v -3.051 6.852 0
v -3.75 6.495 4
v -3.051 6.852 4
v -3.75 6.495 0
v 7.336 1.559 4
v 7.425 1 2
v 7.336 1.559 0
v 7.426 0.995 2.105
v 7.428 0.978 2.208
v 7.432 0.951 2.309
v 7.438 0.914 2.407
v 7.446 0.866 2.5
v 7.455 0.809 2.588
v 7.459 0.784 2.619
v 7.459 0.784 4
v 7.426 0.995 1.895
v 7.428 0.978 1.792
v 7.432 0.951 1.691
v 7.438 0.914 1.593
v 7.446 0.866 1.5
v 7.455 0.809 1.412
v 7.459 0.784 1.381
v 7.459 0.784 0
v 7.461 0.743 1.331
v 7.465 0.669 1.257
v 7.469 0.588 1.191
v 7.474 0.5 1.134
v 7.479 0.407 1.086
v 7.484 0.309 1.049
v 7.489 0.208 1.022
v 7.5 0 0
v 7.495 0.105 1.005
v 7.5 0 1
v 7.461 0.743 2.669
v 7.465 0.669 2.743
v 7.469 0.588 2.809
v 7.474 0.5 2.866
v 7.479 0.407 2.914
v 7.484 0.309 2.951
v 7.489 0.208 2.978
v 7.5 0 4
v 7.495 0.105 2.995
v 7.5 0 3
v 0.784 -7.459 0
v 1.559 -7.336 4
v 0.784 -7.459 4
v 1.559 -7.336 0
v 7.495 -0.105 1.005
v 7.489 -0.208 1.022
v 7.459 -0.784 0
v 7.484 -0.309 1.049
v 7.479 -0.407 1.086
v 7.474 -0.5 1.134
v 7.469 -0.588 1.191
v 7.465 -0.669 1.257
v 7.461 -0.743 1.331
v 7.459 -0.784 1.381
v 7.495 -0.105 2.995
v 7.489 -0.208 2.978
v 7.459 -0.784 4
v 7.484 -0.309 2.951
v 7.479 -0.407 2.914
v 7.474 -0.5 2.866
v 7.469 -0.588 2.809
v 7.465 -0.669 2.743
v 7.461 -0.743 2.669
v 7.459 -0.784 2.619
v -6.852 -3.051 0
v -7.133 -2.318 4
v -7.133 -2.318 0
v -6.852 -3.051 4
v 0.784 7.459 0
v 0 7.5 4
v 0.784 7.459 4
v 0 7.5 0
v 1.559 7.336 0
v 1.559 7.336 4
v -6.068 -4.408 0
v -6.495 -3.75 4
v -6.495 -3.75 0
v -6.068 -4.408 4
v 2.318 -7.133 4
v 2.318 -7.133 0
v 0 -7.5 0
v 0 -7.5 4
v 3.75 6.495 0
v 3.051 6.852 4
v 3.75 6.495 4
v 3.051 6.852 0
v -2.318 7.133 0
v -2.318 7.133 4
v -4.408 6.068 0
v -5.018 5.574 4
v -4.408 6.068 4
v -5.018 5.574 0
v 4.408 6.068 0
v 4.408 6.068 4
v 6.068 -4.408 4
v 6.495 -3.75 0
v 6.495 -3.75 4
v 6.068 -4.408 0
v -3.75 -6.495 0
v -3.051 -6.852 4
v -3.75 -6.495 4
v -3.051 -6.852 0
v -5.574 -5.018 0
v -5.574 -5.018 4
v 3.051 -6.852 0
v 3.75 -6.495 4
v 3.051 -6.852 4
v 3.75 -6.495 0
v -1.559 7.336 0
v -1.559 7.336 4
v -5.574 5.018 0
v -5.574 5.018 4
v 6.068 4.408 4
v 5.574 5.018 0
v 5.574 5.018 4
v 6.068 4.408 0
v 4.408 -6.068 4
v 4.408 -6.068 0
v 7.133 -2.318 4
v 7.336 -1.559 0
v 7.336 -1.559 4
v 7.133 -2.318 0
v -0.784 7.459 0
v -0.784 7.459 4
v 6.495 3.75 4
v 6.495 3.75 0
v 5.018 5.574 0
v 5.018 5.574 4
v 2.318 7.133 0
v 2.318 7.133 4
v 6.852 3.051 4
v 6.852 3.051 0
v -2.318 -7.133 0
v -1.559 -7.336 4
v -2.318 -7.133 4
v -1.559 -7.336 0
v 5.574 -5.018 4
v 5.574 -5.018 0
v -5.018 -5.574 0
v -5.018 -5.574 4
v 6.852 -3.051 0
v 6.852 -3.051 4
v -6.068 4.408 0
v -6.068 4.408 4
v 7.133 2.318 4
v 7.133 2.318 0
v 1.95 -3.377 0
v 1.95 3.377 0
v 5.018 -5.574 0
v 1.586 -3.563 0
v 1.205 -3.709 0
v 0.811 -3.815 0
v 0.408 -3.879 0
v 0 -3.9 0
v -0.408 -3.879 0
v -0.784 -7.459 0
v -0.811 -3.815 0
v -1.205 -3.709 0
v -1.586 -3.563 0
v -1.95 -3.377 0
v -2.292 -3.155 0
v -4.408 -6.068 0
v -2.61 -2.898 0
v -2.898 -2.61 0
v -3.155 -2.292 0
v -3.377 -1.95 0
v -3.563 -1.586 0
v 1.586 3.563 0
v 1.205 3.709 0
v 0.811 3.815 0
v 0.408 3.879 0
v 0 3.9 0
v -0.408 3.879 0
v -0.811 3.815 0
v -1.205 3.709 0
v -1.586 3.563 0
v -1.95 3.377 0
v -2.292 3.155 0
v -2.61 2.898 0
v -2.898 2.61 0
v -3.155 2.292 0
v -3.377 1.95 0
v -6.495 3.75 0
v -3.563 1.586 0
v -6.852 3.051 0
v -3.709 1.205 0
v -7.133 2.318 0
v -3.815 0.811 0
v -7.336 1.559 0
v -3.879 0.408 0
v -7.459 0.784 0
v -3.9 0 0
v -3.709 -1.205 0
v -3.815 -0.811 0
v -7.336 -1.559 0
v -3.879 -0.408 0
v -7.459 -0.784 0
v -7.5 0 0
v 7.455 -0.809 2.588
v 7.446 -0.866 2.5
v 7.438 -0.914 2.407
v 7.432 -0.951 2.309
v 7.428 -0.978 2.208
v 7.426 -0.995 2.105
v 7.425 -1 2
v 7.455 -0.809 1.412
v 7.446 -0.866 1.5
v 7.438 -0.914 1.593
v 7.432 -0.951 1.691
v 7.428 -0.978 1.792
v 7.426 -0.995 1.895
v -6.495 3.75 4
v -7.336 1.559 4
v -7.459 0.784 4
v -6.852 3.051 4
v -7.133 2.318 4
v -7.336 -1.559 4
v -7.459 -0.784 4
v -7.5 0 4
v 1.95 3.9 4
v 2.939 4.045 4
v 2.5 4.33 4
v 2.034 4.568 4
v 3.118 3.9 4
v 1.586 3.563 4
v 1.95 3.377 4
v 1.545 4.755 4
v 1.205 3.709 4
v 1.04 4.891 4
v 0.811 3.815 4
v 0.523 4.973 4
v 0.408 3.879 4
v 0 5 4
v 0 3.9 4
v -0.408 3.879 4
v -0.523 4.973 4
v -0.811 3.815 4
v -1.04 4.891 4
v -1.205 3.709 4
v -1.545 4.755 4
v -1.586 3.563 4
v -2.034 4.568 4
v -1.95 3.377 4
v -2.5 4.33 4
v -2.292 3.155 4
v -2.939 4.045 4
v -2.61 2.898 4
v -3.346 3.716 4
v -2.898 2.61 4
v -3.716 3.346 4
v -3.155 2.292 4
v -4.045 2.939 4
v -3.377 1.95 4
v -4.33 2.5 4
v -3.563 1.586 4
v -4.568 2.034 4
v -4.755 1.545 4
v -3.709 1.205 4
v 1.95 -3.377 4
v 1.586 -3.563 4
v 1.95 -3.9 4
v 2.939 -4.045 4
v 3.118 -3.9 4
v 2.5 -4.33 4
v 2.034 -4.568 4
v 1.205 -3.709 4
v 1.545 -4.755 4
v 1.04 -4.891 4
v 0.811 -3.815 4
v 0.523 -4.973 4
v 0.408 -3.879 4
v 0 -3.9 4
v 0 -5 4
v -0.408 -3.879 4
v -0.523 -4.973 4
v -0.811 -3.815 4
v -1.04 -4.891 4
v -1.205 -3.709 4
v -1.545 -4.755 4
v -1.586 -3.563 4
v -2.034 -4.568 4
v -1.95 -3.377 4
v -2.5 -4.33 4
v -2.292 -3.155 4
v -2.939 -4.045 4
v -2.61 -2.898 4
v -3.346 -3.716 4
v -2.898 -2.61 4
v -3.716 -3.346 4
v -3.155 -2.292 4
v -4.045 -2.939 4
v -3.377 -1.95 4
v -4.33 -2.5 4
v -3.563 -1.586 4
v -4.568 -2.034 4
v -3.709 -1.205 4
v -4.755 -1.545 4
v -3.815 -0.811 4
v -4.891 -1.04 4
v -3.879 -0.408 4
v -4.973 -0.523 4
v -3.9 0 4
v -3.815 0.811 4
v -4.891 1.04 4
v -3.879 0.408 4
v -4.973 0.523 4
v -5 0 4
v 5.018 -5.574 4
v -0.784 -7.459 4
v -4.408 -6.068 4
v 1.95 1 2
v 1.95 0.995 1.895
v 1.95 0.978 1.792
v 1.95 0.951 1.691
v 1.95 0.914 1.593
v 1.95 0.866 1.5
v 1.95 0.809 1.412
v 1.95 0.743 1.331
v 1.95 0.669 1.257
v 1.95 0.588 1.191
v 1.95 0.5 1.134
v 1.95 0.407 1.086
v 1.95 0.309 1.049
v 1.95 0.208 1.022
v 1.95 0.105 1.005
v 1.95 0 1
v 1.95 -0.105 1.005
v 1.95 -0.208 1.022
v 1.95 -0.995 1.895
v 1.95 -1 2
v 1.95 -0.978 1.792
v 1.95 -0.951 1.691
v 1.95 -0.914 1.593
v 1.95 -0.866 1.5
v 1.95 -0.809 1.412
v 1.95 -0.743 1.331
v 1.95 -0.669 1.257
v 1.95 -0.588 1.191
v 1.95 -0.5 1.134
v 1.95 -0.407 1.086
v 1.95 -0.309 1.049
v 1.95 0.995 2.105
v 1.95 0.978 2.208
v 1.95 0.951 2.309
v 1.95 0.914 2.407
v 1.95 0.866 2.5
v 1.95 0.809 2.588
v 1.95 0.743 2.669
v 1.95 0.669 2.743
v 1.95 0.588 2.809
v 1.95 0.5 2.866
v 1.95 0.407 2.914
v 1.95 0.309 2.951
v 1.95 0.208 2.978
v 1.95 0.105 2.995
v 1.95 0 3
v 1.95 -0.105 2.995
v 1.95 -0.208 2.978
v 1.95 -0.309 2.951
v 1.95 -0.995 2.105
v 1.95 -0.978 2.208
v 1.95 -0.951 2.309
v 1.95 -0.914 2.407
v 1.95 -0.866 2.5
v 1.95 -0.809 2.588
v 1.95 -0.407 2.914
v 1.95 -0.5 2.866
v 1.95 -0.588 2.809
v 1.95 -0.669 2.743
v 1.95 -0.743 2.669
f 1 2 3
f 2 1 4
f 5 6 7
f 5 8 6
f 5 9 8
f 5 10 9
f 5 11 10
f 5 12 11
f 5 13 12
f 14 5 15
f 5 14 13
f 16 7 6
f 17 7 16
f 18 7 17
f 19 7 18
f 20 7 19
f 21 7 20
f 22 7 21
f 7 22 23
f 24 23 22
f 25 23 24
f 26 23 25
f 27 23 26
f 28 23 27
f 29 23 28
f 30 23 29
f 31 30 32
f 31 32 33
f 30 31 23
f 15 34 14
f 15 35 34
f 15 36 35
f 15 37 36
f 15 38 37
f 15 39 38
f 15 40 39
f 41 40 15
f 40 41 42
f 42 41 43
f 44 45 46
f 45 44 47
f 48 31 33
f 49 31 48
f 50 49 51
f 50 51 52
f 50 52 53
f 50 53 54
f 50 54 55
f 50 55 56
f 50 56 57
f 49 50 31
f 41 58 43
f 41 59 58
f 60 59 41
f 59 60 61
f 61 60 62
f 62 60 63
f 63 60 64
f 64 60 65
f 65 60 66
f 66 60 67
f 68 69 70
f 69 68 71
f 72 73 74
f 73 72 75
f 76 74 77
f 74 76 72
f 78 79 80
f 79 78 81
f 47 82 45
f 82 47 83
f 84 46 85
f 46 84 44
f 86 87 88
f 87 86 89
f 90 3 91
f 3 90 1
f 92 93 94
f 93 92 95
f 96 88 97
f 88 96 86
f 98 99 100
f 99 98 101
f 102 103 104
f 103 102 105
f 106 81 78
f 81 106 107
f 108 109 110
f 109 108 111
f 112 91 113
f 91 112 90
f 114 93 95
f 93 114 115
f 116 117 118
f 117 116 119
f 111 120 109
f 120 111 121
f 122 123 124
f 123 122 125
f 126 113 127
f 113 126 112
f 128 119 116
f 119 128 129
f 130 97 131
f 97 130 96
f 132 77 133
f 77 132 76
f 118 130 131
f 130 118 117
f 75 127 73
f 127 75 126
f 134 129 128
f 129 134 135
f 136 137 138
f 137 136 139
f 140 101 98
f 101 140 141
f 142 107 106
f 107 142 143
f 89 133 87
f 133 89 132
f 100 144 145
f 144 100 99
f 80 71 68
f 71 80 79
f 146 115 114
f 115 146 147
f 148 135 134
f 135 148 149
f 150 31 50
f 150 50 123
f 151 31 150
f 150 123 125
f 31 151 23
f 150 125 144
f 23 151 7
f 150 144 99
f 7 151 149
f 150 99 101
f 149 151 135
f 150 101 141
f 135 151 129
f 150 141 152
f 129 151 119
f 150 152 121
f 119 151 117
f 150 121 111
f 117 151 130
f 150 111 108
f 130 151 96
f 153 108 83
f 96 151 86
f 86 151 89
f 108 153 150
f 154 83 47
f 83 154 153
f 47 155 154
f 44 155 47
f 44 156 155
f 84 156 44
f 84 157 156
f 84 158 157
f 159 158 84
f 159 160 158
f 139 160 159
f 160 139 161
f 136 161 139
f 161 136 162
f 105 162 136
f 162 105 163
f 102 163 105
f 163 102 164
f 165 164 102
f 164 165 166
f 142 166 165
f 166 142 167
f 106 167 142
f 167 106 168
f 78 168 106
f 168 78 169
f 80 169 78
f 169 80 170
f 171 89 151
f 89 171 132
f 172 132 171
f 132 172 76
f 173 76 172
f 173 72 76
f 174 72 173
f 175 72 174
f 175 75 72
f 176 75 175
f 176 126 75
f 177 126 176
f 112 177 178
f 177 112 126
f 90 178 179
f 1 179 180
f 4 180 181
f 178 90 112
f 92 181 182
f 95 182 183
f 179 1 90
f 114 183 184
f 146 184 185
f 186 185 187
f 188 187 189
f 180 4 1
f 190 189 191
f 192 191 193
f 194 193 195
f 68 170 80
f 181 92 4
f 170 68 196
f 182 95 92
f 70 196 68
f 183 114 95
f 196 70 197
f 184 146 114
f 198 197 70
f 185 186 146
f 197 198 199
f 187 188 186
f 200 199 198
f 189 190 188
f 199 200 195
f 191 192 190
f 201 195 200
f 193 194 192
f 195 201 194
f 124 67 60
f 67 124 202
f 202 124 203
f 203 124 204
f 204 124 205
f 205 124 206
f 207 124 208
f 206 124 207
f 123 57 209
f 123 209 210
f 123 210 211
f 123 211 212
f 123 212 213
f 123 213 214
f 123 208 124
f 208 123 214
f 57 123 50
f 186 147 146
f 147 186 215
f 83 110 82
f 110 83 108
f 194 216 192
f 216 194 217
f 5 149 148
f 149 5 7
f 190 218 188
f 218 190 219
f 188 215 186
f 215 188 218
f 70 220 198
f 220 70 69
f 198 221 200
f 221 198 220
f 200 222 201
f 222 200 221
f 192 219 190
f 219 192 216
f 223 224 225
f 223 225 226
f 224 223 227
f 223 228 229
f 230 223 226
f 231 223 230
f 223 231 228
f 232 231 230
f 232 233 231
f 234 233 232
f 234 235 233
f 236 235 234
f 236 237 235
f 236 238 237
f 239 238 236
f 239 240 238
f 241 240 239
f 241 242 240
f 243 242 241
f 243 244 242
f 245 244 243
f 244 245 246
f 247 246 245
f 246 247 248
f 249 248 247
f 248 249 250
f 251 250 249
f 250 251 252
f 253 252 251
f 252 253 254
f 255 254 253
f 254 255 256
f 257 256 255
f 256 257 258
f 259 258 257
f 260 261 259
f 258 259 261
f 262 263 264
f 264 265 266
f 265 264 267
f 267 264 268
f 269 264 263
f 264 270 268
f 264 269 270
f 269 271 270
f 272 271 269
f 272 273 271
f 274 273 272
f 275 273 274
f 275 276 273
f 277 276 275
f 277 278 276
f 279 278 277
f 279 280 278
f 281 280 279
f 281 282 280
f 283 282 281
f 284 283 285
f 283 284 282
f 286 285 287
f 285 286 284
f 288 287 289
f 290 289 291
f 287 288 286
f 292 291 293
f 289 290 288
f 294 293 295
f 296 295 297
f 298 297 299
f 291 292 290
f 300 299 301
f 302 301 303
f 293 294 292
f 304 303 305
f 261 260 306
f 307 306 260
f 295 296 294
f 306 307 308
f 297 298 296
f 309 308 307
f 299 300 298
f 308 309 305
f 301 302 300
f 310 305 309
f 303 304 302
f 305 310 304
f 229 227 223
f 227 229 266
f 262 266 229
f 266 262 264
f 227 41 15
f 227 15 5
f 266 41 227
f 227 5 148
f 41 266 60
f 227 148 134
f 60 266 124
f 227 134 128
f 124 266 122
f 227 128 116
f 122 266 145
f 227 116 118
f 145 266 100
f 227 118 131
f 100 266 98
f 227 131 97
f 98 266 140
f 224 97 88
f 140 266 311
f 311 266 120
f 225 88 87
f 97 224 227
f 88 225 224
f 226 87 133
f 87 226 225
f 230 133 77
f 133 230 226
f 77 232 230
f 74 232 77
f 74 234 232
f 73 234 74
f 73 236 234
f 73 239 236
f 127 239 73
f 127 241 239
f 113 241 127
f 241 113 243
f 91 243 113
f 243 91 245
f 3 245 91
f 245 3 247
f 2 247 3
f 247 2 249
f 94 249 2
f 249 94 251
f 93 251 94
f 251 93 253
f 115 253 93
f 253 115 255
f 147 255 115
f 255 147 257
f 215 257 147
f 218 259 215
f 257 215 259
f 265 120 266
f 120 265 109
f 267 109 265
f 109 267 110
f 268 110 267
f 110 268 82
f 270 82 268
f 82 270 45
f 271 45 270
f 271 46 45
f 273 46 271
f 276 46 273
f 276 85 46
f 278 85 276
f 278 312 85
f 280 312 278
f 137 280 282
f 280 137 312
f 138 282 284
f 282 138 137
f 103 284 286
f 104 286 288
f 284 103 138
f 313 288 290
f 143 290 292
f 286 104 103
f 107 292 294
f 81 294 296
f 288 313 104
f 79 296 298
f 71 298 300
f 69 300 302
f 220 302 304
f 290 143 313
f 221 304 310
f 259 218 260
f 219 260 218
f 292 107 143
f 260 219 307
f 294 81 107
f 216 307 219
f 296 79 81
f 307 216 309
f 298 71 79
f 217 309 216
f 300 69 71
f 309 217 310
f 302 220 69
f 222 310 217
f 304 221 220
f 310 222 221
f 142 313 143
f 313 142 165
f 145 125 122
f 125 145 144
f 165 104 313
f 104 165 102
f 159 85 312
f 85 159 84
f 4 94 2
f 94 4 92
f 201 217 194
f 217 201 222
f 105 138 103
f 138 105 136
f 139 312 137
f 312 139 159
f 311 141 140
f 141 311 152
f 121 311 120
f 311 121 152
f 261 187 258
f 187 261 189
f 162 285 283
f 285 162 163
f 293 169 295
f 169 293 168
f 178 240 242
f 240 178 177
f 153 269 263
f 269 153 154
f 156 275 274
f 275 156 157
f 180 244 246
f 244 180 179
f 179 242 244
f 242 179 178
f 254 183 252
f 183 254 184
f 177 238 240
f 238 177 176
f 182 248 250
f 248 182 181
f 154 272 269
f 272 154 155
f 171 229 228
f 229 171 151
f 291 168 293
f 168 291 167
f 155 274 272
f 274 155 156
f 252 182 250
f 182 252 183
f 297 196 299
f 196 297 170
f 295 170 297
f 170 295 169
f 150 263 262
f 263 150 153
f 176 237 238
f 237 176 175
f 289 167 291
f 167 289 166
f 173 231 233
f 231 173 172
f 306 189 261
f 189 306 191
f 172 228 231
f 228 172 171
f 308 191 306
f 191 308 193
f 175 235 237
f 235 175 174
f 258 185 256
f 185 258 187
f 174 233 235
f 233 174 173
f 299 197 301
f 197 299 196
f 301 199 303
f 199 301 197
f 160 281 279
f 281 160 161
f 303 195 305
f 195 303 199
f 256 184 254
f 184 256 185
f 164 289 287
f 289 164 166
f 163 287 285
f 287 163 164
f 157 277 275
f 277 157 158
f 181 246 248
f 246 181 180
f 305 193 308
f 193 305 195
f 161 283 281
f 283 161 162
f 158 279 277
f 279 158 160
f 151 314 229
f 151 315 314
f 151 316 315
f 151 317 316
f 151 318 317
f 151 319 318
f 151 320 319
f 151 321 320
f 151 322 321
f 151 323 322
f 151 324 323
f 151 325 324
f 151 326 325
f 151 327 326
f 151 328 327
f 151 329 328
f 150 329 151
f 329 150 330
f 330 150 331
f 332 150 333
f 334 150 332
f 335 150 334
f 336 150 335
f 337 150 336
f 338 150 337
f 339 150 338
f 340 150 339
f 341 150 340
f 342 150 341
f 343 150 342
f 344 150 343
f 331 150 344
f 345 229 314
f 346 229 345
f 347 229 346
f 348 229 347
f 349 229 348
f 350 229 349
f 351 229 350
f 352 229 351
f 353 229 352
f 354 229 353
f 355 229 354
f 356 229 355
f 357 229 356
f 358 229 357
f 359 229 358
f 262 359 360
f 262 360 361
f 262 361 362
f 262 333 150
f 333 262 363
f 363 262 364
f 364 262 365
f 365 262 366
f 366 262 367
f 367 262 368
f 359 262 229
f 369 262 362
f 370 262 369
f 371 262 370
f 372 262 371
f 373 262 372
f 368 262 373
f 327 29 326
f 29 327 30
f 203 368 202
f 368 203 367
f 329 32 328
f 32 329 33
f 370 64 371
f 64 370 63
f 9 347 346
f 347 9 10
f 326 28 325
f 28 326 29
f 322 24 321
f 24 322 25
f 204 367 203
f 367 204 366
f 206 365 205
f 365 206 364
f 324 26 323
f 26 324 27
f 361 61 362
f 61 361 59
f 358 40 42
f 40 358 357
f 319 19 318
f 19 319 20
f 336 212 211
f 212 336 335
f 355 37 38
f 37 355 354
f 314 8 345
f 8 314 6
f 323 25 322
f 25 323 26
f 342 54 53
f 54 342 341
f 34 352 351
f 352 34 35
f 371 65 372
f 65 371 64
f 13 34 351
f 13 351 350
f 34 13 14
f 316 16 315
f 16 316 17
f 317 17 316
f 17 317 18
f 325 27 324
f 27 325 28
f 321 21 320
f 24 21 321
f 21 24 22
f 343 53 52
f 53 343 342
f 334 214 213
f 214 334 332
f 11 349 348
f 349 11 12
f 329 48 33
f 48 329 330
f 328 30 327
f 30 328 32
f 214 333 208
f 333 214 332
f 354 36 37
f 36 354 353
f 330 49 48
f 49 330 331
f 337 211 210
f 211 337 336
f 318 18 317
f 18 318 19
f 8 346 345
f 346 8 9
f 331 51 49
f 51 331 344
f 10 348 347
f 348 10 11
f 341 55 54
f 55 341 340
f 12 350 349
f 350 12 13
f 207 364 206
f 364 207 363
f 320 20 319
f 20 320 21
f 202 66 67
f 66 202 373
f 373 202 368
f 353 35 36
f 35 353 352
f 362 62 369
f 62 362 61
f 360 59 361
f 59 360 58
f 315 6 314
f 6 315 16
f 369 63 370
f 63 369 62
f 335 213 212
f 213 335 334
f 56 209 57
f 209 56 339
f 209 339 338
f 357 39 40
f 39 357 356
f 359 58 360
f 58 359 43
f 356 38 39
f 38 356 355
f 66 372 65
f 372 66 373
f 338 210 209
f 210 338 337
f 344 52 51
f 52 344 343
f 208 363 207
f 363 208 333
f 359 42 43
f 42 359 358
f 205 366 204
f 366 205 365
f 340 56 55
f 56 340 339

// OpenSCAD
// robot wheel for gear motors
$fn = 60;
diameter = 15;
rim_thickness = 4;
rim_diameter = 5; // subtracted from total diameter
disc_thickness = 4; 

// 4mm with cutout at 2 works but is sloppy
difference(){
    union(){
difference(){
cylinder(h = rim_thickness, r = diameter/2);
translate([0,0,disc_thickness])
    cylinder(h = disc_thickness, r = (diameter-rim_diameter)/2);
    
cylinder(h = disc_thickness, r = 3.9); //this size fits perfectly, sliding on with nearly no slop
}
translate([(3.9/2), -3.9, 0])
    cube([3.9, 7.8, disc_thickness]);
}
translate([0, 0, 2])
rotate([0, 90, 0])
    cylinder(h = diameter+2, r = 1);
}
